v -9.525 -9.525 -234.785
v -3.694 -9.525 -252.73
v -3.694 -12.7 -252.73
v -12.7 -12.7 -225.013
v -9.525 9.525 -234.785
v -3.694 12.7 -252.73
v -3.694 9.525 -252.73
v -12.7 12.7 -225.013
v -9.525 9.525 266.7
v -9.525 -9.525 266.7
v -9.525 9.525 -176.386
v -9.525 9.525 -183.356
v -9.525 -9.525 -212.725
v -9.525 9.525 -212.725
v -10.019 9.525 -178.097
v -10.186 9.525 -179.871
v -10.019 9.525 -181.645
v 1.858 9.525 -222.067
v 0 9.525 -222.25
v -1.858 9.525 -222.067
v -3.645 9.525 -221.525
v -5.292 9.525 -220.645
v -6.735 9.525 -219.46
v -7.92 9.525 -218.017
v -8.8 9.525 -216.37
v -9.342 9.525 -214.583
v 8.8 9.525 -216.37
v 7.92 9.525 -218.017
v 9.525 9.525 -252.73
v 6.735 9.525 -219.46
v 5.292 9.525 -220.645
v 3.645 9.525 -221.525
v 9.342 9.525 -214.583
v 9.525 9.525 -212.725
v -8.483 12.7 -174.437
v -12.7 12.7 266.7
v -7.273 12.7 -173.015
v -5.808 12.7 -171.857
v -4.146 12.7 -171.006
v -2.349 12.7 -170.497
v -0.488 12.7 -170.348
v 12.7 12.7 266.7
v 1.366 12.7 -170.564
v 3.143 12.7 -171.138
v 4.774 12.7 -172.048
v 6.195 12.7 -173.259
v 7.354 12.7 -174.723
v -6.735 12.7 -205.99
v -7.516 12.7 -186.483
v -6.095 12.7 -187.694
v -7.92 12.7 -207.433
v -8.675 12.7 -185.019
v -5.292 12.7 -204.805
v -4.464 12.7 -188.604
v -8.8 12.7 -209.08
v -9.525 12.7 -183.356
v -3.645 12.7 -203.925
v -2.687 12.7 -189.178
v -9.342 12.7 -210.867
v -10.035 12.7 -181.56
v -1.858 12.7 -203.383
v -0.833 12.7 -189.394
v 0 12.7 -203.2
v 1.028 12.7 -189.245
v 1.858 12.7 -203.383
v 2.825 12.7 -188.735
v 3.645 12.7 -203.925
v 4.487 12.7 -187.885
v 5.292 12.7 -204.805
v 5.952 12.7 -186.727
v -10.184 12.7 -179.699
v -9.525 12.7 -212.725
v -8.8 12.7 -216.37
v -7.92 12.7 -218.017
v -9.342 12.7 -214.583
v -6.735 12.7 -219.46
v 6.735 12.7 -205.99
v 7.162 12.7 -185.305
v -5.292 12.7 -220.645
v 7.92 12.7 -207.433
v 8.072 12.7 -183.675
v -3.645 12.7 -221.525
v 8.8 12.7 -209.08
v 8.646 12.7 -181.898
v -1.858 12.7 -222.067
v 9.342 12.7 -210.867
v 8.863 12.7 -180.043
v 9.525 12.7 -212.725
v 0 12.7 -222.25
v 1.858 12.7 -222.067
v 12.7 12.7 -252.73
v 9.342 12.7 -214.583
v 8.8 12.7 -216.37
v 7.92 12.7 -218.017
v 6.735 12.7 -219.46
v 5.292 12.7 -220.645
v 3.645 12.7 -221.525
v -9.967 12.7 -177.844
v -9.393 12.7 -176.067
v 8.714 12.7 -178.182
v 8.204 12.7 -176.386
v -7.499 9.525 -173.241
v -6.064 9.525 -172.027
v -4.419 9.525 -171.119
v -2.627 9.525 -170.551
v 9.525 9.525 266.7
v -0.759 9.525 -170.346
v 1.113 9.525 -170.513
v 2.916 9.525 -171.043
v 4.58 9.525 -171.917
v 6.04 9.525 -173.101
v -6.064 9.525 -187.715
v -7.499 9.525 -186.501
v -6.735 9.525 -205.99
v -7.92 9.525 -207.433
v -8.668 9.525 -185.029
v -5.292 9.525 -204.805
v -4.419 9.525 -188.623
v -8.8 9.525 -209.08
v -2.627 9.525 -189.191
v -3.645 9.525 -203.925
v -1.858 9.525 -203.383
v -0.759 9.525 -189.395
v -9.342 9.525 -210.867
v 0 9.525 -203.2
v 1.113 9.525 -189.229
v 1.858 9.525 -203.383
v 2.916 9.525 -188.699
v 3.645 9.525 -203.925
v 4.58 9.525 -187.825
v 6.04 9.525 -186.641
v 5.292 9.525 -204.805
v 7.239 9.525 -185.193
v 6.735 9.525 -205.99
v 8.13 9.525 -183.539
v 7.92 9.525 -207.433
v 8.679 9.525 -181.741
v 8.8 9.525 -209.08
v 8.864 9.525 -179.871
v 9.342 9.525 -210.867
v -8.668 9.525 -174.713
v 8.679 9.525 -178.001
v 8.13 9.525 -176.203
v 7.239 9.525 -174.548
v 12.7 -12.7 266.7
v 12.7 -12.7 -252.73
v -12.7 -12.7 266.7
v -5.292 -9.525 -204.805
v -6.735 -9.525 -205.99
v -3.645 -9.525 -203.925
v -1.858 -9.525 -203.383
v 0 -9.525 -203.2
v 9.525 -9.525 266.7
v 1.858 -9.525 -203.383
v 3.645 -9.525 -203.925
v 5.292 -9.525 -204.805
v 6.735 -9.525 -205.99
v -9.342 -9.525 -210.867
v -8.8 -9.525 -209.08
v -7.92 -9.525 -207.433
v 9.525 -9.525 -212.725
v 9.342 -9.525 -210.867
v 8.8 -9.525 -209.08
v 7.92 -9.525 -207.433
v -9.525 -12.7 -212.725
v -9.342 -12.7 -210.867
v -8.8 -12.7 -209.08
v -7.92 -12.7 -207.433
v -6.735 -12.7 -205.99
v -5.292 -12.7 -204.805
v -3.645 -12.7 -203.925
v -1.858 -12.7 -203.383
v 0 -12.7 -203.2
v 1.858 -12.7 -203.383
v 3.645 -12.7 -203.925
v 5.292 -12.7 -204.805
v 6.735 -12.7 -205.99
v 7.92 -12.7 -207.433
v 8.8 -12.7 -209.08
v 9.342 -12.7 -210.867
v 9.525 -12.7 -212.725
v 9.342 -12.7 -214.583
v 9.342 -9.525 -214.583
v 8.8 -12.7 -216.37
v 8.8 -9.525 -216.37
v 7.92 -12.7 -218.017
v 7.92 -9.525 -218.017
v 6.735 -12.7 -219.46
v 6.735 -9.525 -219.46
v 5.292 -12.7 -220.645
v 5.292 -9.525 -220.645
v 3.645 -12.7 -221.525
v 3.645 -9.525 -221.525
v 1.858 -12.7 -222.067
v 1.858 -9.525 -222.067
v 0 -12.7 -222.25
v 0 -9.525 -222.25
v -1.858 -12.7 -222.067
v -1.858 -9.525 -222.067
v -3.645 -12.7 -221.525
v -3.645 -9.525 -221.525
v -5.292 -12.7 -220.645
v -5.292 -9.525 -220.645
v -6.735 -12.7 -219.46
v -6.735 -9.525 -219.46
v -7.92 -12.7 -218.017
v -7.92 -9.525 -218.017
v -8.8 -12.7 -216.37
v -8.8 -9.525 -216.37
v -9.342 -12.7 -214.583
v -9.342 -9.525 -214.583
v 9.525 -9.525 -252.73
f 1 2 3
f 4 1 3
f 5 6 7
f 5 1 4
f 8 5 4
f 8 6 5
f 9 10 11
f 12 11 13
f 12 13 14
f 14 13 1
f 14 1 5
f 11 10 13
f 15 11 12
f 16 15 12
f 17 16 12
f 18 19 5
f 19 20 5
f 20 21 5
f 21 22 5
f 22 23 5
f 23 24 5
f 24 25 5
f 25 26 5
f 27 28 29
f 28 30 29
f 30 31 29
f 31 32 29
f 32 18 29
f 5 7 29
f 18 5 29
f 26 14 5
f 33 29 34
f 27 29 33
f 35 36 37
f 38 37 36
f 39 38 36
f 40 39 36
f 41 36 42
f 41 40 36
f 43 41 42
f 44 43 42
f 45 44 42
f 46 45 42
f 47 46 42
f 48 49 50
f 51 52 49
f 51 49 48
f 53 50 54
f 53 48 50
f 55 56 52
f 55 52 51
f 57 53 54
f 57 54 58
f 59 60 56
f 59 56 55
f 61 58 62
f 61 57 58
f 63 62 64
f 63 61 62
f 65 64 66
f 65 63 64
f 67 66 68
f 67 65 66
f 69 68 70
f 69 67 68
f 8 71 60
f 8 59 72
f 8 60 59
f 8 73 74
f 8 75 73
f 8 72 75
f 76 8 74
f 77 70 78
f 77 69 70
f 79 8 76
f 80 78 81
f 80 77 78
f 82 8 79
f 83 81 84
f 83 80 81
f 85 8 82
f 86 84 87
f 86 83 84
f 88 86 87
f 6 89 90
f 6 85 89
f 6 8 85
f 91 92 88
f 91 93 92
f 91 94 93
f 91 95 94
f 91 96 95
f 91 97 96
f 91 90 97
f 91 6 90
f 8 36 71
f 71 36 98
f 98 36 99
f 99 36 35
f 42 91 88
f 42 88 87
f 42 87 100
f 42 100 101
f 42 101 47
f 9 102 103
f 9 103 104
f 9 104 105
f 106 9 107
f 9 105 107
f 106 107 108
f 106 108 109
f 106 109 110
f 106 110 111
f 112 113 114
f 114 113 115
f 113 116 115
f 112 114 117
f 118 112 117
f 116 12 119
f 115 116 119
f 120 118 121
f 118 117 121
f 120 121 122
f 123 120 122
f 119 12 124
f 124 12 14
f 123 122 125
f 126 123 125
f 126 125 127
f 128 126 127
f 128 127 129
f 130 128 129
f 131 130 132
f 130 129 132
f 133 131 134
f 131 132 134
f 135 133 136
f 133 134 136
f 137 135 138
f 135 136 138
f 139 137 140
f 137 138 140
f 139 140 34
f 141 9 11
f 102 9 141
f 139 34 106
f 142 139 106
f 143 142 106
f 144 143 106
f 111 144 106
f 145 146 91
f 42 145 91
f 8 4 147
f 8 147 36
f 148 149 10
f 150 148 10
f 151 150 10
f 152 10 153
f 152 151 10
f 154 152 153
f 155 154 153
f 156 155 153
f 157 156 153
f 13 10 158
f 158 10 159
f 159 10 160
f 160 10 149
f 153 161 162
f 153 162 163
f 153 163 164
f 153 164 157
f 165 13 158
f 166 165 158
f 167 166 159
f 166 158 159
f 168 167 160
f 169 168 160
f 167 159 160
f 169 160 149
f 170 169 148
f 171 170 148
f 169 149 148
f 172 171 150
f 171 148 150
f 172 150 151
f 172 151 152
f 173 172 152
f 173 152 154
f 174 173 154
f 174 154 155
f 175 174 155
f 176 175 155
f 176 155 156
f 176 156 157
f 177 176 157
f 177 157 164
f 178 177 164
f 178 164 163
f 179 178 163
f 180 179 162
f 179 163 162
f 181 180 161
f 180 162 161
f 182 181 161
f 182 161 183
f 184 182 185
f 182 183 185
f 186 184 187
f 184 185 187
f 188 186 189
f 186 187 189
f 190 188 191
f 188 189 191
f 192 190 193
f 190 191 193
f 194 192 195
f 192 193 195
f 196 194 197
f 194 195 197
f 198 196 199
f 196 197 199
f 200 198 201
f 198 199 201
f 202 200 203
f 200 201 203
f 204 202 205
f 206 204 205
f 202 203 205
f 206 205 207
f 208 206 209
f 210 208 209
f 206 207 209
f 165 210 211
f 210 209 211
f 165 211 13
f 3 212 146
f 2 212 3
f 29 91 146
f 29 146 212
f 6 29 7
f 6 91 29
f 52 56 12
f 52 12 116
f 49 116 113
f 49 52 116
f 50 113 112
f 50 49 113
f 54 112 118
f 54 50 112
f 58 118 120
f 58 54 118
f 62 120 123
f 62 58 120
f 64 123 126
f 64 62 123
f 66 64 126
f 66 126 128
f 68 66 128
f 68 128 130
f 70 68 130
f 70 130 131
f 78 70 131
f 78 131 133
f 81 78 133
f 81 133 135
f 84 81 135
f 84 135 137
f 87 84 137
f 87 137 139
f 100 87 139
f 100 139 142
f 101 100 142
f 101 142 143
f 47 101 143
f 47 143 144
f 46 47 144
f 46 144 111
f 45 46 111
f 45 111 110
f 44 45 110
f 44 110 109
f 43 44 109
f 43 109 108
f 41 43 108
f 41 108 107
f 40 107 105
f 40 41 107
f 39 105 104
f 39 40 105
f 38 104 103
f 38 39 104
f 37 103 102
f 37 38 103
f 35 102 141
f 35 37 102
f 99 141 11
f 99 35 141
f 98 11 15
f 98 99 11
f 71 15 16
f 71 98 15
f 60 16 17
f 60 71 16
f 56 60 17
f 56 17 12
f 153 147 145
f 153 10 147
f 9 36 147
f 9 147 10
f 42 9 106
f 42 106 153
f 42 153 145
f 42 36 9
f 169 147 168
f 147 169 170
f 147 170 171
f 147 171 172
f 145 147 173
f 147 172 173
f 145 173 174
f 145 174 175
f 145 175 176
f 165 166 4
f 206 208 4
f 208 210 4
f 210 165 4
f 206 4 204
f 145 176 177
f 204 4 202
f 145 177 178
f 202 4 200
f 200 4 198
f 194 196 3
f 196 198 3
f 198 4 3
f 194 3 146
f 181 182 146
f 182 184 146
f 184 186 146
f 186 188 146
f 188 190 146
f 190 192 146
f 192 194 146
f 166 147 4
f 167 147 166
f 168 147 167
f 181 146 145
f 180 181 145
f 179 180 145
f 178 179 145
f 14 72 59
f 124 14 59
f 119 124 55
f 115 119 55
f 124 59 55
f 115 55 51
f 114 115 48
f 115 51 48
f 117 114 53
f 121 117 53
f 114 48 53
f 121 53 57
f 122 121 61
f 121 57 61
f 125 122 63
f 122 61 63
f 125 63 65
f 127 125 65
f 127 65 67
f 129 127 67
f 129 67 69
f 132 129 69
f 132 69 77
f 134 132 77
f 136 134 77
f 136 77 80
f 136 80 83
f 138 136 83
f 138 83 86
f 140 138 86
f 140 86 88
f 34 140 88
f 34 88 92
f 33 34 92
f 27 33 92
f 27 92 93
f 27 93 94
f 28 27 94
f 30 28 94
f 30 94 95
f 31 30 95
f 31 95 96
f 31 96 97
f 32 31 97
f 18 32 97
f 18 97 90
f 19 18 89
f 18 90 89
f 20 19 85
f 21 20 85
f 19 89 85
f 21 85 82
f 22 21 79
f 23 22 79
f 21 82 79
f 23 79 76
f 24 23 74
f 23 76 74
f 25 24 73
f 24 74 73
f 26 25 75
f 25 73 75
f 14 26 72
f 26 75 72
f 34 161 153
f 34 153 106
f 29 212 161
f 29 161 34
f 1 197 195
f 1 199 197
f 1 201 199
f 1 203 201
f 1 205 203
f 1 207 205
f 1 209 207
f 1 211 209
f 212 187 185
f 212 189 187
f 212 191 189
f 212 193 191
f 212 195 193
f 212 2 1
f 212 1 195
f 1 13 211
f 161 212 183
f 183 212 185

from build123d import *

# Parameters (mm, degrees)
BOSS_EXTRUDE1_DEPTH      = 266.7
BOSS_EXTRUDE1_DEPTH_BACK = 266.7
SKETCH3_W                = 25.4
SKETCH3_H                = 25.4
SKETCH3_W_2              = 19.05
SKETCH3_H_2              = 19.05
SKETCH4_R                = 9.525
CUT_EXTRUDE1_DEPTH       = 25.4
SKETCH5_R                = 9.525
CUT_EXTRUDE2_DEPTH       = 3.175


with BuildPart() as part:
    # Sketch3 → Boss-Extrude1 (new, two sides: drawn at the far end of the back side and taken through both)
    with BuildSketch(Plane.XY.offset(-BOSS_EXTRUDE1_DEPTH_BACK)):
        Rectangle(SKETCH3_W, SKETCH3_H)
        Rectangle(SKETCH3_W_2, SKETCH3_H_2, mode=Mode.SUBTRACT)
    extrude(amount=BOSS_EXTRUDE1_DEPTH + BOSS_EXTRUDE1_DEPTH_BACK)

    # Sketch4 → Cut-Extrude1 (cut)
    with BuildSketch(Plane(origin=(0, 12.7, 0), x_dir=(1, 0, 0), z_dir=(0, 1, 0))):
        with Locations(Location((0, 212.725, 0), (0, 0, 180))):
            Circle(SKETCH4_R)
        Polygon((-12.7, 225.013453558), (-12.7, 266.7), (12.7, 266.7), (12.7, 252.73), (-3.69434815, 252.73), align=None)
    extrude(amount=-CUT_EXTRUDE1_DEPTH, mode=Mode.SUBTRACT)

    # Sketch5 → Cut-Extrude2 (cut)
    with BuildSketch(Plane.XZ.offset(-12.7)):
        with Locations(Location((-0.660548484, -179.870948658, 0), (0, 0, 201.463465423))):
            Circle(SKETCH5_R)
    extrude(amount=CUT_EXTRUDE2_DEPTH, mode=Mode.SUBTRACT)


solid = part.part
